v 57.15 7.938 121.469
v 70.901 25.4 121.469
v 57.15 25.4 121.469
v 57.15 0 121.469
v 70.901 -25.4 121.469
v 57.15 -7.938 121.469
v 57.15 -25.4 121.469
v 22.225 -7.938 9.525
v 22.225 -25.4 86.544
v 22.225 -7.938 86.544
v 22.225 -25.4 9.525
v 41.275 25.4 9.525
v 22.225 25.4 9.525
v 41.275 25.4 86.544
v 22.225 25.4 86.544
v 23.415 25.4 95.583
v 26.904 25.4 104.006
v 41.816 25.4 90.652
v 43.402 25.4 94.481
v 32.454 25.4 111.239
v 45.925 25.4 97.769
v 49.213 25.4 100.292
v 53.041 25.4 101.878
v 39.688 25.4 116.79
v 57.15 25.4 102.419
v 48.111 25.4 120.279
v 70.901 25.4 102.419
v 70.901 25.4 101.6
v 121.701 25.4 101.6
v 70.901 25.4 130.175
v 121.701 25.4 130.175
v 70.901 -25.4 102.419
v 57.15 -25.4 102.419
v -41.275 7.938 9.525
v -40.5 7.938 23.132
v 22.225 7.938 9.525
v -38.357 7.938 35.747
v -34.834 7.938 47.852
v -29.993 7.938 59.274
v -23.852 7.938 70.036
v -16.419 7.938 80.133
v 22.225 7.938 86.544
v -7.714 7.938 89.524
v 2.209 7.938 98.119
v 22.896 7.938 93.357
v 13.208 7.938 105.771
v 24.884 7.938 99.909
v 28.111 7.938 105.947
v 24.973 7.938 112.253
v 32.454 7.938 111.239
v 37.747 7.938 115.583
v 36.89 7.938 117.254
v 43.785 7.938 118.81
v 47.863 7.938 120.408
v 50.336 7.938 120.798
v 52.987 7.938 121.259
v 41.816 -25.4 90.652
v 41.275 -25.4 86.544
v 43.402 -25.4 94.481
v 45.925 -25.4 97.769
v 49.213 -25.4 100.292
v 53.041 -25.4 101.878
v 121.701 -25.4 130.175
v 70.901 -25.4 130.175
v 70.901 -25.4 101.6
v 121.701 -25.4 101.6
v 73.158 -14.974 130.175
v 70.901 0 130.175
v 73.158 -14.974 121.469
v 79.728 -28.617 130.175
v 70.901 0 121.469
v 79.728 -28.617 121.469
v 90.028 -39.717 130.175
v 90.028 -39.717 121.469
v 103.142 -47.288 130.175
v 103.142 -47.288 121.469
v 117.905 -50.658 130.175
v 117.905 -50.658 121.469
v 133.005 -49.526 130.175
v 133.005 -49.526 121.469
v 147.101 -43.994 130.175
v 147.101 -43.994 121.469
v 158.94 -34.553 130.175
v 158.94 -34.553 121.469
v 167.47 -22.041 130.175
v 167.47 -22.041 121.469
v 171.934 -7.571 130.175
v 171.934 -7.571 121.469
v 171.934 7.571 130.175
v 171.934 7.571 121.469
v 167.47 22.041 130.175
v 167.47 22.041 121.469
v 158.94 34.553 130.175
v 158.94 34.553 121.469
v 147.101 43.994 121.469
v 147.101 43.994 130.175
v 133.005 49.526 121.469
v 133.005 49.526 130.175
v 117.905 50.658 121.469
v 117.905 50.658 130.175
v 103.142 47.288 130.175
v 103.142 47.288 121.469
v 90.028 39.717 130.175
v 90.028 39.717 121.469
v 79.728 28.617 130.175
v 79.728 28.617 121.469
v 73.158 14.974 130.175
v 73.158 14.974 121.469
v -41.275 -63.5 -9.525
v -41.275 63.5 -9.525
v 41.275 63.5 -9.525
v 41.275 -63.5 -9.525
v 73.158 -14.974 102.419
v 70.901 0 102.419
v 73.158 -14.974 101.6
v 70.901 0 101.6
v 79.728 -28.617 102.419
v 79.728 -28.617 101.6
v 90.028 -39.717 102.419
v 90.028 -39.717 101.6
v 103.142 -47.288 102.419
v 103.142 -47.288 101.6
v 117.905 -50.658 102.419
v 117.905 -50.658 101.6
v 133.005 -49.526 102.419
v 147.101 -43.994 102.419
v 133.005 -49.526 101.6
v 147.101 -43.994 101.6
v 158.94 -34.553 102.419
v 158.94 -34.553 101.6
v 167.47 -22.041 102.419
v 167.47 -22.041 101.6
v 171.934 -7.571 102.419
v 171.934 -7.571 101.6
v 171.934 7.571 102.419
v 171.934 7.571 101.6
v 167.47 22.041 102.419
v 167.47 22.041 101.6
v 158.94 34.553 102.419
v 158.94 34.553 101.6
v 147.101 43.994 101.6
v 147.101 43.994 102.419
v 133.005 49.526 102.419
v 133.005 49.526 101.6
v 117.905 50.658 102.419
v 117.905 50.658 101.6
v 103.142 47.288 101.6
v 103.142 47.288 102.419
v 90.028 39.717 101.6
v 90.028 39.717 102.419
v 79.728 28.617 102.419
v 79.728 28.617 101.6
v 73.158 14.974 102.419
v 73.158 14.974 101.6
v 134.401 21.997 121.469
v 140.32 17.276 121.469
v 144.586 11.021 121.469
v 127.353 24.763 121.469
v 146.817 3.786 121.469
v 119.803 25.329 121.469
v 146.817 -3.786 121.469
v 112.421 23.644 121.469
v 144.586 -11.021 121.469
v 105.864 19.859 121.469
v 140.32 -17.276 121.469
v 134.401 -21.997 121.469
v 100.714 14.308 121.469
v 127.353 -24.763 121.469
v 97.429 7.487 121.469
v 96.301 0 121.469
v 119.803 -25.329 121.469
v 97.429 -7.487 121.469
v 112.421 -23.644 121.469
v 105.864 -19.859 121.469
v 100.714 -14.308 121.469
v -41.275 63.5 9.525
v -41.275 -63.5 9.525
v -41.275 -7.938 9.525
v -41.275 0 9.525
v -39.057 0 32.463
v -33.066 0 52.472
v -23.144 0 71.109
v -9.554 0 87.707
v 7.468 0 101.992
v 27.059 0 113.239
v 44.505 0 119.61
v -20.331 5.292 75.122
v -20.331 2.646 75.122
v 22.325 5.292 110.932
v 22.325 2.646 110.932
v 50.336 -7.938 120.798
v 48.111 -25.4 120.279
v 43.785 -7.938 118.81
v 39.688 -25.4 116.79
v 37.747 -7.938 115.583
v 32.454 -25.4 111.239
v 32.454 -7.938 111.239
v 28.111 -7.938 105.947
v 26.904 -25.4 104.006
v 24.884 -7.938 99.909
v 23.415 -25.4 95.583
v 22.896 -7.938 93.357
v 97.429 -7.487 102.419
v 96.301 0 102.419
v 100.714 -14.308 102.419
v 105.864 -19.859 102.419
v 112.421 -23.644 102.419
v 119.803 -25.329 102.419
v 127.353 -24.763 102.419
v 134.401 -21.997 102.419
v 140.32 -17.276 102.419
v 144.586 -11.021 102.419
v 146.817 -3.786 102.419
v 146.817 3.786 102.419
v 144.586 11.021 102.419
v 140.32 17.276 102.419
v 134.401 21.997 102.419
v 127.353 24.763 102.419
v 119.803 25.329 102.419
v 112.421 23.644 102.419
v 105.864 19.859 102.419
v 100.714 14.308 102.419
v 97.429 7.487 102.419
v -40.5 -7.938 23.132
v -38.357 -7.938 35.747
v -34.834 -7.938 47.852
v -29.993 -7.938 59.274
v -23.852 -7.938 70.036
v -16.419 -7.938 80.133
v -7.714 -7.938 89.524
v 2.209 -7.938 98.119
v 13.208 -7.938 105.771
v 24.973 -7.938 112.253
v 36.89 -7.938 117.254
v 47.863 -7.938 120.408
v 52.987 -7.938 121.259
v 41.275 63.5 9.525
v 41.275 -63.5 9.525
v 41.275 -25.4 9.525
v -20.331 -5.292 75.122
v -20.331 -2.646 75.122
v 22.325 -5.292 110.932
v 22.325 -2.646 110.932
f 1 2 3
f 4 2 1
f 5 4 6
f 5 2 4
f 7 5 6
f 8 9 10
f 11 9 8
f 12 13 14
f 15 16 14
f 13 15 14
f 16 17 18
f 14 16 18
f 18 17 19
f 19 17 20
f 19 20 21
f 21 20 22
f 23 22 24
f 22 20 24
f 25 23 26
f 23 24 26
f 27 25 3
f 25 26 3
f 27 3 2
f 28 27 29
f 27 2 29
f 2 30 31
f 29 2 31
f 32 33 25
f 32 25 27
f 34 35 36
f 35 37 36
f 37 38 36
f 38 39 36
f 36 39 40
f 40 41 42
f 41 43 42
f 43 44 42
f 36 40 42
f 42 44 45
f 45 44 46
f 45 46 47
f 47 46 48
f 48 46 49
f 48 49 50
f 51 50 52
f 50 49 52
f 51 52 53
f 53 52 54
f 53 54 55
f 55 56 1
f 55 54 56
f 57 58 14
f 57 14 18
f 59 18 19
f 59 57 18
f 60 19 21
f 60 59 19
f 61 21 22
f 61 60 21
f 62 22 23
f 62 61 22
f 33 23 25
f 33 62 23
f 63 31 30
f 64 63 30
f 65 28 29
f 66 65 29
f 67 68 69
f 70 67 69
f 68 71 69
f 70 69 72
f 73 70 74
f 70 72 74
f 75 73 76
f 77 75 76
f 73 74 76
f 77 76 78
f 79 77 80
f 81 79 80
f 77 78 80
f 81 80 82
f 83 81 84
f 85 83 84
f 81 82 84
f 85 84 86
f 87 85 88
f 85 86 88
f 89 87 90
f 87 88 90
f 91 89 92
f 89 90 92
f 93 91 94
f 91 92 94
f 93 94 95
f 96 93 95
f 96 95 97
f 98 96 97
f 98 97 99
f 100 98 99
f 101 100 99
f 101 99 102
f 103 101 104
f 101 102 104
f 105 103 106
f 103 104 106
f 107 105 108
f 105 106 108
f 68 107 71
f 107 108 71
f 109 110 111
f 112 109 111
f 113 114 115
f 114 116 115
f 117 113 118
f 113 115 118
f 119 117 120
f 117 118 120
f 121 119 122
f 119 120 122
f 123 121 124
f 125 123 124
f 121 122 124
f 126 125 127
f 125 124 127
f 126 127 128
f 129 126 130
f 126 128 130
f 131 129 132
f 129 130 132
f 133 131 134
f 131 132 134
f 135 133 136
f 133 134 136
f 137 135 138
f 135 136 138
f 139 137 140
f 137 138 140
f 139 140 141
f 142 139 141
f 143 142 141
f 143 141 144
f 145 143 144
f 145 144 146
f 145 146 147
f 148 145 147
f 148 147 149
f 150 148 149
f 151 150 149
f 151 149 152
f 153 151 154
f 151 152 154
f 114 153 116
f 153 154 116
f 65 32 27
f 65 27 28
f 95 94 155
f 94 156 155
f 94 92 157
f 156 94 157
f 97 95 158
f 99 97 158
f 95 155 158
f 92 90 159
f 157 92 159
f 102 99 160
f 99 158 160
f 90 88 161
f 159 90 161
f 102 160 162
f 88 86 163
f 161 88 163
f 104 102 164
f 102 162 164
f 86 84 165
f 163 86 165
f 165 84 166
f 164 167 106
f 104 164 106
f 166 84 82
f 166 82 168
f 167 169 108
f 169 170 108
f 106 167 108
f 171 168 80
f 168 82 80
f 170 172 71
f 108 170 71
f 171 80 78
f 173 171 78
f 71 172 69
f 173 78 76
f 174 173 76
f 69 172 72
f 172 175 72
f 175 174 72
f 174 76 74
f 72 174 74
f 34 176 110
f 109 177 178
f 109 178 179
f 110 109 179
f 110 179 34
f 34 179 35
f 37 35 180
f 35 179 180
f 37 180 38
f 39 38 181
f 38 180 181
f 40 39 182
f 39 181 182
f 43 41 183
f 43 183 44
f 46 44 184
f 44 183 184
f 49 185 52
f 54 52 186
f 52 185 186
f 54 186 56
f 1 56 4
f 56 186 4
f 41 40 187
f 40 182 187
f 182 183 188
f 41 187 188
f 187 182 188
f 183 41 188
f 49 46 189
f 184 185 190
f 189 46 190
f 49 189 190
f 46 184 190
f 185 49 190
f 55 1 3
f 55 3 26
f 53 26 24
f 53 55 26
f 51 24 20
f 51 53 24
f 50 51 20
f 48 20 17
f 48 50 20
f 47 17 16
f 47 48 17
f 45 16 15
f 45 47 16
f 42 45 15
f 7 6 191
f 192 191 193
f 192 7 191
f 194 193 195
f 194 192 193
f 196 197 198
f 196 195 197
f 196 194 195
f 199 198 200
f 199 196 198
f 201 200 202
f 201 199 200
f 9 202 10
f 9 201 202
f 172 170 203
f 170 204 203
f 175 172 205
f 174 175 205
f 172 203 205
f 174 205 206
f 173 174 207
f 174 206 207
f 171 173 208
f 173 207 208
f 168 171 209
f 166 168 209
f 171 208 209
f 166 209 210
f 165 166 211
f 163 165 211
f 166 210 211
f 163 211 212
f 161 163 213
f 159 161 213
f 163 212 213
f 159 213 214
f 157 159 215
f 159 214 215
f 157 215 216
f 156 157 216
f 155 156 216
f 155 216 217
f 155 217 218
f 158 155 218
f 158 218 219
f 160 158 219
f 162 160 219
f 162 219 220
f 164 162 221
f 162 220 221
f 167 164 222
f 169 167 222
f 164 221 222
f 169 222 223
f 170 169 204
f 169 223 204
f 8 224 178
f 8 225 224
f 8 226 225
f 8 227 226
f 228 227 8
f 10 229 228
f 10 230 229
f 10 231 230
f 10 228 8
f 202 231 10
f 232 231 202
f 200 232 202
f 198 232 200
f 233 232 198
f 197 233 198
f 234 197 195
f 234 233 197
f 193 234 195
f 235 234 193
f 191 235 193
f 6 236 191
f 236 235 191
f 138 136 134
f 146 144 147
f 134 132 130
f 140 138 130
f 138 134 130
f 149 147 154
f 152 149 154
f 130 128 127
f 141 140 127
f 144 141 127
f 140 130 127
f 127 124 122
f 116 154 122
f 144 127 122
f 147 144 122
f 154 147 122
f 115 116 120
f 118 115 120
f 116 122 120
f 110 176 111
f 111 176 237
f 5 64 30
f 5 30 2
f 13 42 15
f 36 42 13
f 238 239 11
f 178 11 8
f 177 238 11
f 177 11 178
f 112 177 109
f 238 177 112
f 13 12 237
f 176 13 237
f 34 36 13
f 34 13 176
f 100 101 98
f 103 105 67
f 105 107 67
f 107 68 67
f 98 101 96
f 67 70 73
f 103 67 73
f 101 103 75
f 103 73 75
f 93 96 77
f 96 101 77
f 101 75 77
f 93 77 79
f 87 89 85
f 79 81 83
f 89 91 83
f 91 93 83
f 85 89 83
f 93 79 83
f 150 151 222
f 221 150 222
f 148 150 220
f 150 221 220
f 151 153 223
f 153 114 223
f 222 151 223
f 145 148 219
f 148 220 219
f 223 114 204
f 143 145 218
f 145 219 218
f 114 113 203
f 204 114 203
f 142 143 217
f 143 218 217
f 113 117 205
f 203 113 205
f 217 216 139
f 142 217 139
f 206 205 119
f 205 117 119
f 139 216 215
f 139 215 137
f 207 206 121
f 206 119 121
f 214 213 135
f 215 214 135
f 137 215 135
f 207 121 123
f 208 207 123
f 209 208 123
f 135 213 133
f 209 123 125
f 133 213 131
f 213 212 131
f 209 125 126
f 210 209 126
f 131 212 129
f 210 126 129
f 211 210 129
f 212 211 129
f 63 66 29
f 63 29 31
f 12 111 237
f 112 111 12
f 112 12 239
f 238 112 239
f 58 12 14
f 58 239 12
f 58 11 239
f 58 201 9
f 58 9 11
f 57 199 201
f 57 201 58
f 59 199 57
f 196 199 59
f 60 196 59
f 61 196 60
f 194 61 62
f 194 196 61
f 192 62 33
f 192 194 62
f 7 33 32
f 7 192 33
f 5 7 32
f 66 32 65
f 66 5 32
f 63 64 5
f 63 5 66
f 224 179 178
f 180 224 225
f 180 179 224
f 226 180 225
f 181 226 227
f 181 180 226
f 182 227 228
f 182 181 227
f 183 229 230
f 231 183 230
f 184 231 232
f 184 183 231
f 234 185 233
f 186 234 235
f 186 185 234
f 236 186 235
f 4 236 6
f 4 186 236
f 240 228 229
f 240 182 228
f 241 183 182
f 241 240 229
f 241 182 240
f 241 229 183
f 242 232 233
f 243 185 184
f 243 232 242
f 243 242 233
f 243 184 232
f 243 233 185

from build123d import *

# Parameters (mm, degrees)
F1_DEPTH = 63.5
F0_W     = 25.4
F0_H     = 19.05
F2_DEPTH = 25.4
F3_DEPTH = 7.9375


with BuildPart() as f1:
    # F0 (on Front) → F1 (new body, symmetric)
    with BuildSketch(Plane.XZ):
        Polygon((41.275, -9.525), (41.275, 9.525), (22.225, 9.525), (-41.275, 9.525), (-41.275, -9.525), align=None)
    extrude(amount=F1_DEPTH, both=True)

    # F0 (on Front) → F2 (join, symmetric)
    with BuildSketch(Plane.XZ):
        with BuildLine():
            Line((22.225, 9.525), (41.275, 9.525))
            Line((41.275, 9.525), (41.275, 86.543629))
            ThreePointArc((41.275, 86.543629), (45.92468, 97.768949), (57.15, 102.418629))
            Line((57.15, 102.418629), (70.900955, 102.418629))
            Line((70.900955, 102.418629), (70.900955, 121.468629))
            Line((70.900955, 121.468629), (57.15, 121.468629))
            ThreePointArc((57.15, 121.468629), (32.454296, 111.239333), (22.225, 86.543629))
            Line((22.225, 86.543629), (22.225, 9.525))
        make_face()
        Polygon((96.300955, 102.418629), (70.900955, 102.418629), (70.900955, 101.6), (121.700955, 101.6), (121.700955, 130.175), (70.900955, 130.175), (70.900955, 121.468629), (96.300955, 121.468629), align=None)
        with Locations((83.600955, 111.943629)):
            Rectangle(F0_W, F0_H)
    extrude(amount=F2_DEPTH, both=True)

    # F0 (on Front) → F3 (join, symmetric)
    with BuildSketch(Plane.XZ):
        with BuildLine():
            Line((-41.275, 9.525), (22.225, 9.525))
            Line((22.225, 9.525), (22.225, 86.543629))
            ThreePointArc((22.225, 86.543629), (32.454296, 111.239333), (57.15, 121.468629))
            add(Edge.make_bspline(
                [(-41.275, 9.525), (-41.035183, 91.519339), (36.089094, 122.064555), (57.15, 121.468629)],
                knots=[0, 0, 0, 0, 149.059909, 149.059909, 149.059909, 149.059909], degree=3))
        make_face()
    extrude(amount=F3_DEPTH, both=True)


with BuildPart() as f4:
    # F0 (on Front) → F4 (revolve)
    with BuildSketch(Plane.XZ):
        Polygon((96.300955, 102.418629), (70.900955, 102.418629), (70.900955, 101.6), (121.700955, 101.6), (121.700955, 130.175), (70.900955, 130.175), (70.900955, 121.468629), (96.300955, 121.468629), align=None)
    revolve(axis=Axis((121.700955, 0, 115.8875), (0, 0, 1)))


solid = Compound([f1.part, f4.part])
